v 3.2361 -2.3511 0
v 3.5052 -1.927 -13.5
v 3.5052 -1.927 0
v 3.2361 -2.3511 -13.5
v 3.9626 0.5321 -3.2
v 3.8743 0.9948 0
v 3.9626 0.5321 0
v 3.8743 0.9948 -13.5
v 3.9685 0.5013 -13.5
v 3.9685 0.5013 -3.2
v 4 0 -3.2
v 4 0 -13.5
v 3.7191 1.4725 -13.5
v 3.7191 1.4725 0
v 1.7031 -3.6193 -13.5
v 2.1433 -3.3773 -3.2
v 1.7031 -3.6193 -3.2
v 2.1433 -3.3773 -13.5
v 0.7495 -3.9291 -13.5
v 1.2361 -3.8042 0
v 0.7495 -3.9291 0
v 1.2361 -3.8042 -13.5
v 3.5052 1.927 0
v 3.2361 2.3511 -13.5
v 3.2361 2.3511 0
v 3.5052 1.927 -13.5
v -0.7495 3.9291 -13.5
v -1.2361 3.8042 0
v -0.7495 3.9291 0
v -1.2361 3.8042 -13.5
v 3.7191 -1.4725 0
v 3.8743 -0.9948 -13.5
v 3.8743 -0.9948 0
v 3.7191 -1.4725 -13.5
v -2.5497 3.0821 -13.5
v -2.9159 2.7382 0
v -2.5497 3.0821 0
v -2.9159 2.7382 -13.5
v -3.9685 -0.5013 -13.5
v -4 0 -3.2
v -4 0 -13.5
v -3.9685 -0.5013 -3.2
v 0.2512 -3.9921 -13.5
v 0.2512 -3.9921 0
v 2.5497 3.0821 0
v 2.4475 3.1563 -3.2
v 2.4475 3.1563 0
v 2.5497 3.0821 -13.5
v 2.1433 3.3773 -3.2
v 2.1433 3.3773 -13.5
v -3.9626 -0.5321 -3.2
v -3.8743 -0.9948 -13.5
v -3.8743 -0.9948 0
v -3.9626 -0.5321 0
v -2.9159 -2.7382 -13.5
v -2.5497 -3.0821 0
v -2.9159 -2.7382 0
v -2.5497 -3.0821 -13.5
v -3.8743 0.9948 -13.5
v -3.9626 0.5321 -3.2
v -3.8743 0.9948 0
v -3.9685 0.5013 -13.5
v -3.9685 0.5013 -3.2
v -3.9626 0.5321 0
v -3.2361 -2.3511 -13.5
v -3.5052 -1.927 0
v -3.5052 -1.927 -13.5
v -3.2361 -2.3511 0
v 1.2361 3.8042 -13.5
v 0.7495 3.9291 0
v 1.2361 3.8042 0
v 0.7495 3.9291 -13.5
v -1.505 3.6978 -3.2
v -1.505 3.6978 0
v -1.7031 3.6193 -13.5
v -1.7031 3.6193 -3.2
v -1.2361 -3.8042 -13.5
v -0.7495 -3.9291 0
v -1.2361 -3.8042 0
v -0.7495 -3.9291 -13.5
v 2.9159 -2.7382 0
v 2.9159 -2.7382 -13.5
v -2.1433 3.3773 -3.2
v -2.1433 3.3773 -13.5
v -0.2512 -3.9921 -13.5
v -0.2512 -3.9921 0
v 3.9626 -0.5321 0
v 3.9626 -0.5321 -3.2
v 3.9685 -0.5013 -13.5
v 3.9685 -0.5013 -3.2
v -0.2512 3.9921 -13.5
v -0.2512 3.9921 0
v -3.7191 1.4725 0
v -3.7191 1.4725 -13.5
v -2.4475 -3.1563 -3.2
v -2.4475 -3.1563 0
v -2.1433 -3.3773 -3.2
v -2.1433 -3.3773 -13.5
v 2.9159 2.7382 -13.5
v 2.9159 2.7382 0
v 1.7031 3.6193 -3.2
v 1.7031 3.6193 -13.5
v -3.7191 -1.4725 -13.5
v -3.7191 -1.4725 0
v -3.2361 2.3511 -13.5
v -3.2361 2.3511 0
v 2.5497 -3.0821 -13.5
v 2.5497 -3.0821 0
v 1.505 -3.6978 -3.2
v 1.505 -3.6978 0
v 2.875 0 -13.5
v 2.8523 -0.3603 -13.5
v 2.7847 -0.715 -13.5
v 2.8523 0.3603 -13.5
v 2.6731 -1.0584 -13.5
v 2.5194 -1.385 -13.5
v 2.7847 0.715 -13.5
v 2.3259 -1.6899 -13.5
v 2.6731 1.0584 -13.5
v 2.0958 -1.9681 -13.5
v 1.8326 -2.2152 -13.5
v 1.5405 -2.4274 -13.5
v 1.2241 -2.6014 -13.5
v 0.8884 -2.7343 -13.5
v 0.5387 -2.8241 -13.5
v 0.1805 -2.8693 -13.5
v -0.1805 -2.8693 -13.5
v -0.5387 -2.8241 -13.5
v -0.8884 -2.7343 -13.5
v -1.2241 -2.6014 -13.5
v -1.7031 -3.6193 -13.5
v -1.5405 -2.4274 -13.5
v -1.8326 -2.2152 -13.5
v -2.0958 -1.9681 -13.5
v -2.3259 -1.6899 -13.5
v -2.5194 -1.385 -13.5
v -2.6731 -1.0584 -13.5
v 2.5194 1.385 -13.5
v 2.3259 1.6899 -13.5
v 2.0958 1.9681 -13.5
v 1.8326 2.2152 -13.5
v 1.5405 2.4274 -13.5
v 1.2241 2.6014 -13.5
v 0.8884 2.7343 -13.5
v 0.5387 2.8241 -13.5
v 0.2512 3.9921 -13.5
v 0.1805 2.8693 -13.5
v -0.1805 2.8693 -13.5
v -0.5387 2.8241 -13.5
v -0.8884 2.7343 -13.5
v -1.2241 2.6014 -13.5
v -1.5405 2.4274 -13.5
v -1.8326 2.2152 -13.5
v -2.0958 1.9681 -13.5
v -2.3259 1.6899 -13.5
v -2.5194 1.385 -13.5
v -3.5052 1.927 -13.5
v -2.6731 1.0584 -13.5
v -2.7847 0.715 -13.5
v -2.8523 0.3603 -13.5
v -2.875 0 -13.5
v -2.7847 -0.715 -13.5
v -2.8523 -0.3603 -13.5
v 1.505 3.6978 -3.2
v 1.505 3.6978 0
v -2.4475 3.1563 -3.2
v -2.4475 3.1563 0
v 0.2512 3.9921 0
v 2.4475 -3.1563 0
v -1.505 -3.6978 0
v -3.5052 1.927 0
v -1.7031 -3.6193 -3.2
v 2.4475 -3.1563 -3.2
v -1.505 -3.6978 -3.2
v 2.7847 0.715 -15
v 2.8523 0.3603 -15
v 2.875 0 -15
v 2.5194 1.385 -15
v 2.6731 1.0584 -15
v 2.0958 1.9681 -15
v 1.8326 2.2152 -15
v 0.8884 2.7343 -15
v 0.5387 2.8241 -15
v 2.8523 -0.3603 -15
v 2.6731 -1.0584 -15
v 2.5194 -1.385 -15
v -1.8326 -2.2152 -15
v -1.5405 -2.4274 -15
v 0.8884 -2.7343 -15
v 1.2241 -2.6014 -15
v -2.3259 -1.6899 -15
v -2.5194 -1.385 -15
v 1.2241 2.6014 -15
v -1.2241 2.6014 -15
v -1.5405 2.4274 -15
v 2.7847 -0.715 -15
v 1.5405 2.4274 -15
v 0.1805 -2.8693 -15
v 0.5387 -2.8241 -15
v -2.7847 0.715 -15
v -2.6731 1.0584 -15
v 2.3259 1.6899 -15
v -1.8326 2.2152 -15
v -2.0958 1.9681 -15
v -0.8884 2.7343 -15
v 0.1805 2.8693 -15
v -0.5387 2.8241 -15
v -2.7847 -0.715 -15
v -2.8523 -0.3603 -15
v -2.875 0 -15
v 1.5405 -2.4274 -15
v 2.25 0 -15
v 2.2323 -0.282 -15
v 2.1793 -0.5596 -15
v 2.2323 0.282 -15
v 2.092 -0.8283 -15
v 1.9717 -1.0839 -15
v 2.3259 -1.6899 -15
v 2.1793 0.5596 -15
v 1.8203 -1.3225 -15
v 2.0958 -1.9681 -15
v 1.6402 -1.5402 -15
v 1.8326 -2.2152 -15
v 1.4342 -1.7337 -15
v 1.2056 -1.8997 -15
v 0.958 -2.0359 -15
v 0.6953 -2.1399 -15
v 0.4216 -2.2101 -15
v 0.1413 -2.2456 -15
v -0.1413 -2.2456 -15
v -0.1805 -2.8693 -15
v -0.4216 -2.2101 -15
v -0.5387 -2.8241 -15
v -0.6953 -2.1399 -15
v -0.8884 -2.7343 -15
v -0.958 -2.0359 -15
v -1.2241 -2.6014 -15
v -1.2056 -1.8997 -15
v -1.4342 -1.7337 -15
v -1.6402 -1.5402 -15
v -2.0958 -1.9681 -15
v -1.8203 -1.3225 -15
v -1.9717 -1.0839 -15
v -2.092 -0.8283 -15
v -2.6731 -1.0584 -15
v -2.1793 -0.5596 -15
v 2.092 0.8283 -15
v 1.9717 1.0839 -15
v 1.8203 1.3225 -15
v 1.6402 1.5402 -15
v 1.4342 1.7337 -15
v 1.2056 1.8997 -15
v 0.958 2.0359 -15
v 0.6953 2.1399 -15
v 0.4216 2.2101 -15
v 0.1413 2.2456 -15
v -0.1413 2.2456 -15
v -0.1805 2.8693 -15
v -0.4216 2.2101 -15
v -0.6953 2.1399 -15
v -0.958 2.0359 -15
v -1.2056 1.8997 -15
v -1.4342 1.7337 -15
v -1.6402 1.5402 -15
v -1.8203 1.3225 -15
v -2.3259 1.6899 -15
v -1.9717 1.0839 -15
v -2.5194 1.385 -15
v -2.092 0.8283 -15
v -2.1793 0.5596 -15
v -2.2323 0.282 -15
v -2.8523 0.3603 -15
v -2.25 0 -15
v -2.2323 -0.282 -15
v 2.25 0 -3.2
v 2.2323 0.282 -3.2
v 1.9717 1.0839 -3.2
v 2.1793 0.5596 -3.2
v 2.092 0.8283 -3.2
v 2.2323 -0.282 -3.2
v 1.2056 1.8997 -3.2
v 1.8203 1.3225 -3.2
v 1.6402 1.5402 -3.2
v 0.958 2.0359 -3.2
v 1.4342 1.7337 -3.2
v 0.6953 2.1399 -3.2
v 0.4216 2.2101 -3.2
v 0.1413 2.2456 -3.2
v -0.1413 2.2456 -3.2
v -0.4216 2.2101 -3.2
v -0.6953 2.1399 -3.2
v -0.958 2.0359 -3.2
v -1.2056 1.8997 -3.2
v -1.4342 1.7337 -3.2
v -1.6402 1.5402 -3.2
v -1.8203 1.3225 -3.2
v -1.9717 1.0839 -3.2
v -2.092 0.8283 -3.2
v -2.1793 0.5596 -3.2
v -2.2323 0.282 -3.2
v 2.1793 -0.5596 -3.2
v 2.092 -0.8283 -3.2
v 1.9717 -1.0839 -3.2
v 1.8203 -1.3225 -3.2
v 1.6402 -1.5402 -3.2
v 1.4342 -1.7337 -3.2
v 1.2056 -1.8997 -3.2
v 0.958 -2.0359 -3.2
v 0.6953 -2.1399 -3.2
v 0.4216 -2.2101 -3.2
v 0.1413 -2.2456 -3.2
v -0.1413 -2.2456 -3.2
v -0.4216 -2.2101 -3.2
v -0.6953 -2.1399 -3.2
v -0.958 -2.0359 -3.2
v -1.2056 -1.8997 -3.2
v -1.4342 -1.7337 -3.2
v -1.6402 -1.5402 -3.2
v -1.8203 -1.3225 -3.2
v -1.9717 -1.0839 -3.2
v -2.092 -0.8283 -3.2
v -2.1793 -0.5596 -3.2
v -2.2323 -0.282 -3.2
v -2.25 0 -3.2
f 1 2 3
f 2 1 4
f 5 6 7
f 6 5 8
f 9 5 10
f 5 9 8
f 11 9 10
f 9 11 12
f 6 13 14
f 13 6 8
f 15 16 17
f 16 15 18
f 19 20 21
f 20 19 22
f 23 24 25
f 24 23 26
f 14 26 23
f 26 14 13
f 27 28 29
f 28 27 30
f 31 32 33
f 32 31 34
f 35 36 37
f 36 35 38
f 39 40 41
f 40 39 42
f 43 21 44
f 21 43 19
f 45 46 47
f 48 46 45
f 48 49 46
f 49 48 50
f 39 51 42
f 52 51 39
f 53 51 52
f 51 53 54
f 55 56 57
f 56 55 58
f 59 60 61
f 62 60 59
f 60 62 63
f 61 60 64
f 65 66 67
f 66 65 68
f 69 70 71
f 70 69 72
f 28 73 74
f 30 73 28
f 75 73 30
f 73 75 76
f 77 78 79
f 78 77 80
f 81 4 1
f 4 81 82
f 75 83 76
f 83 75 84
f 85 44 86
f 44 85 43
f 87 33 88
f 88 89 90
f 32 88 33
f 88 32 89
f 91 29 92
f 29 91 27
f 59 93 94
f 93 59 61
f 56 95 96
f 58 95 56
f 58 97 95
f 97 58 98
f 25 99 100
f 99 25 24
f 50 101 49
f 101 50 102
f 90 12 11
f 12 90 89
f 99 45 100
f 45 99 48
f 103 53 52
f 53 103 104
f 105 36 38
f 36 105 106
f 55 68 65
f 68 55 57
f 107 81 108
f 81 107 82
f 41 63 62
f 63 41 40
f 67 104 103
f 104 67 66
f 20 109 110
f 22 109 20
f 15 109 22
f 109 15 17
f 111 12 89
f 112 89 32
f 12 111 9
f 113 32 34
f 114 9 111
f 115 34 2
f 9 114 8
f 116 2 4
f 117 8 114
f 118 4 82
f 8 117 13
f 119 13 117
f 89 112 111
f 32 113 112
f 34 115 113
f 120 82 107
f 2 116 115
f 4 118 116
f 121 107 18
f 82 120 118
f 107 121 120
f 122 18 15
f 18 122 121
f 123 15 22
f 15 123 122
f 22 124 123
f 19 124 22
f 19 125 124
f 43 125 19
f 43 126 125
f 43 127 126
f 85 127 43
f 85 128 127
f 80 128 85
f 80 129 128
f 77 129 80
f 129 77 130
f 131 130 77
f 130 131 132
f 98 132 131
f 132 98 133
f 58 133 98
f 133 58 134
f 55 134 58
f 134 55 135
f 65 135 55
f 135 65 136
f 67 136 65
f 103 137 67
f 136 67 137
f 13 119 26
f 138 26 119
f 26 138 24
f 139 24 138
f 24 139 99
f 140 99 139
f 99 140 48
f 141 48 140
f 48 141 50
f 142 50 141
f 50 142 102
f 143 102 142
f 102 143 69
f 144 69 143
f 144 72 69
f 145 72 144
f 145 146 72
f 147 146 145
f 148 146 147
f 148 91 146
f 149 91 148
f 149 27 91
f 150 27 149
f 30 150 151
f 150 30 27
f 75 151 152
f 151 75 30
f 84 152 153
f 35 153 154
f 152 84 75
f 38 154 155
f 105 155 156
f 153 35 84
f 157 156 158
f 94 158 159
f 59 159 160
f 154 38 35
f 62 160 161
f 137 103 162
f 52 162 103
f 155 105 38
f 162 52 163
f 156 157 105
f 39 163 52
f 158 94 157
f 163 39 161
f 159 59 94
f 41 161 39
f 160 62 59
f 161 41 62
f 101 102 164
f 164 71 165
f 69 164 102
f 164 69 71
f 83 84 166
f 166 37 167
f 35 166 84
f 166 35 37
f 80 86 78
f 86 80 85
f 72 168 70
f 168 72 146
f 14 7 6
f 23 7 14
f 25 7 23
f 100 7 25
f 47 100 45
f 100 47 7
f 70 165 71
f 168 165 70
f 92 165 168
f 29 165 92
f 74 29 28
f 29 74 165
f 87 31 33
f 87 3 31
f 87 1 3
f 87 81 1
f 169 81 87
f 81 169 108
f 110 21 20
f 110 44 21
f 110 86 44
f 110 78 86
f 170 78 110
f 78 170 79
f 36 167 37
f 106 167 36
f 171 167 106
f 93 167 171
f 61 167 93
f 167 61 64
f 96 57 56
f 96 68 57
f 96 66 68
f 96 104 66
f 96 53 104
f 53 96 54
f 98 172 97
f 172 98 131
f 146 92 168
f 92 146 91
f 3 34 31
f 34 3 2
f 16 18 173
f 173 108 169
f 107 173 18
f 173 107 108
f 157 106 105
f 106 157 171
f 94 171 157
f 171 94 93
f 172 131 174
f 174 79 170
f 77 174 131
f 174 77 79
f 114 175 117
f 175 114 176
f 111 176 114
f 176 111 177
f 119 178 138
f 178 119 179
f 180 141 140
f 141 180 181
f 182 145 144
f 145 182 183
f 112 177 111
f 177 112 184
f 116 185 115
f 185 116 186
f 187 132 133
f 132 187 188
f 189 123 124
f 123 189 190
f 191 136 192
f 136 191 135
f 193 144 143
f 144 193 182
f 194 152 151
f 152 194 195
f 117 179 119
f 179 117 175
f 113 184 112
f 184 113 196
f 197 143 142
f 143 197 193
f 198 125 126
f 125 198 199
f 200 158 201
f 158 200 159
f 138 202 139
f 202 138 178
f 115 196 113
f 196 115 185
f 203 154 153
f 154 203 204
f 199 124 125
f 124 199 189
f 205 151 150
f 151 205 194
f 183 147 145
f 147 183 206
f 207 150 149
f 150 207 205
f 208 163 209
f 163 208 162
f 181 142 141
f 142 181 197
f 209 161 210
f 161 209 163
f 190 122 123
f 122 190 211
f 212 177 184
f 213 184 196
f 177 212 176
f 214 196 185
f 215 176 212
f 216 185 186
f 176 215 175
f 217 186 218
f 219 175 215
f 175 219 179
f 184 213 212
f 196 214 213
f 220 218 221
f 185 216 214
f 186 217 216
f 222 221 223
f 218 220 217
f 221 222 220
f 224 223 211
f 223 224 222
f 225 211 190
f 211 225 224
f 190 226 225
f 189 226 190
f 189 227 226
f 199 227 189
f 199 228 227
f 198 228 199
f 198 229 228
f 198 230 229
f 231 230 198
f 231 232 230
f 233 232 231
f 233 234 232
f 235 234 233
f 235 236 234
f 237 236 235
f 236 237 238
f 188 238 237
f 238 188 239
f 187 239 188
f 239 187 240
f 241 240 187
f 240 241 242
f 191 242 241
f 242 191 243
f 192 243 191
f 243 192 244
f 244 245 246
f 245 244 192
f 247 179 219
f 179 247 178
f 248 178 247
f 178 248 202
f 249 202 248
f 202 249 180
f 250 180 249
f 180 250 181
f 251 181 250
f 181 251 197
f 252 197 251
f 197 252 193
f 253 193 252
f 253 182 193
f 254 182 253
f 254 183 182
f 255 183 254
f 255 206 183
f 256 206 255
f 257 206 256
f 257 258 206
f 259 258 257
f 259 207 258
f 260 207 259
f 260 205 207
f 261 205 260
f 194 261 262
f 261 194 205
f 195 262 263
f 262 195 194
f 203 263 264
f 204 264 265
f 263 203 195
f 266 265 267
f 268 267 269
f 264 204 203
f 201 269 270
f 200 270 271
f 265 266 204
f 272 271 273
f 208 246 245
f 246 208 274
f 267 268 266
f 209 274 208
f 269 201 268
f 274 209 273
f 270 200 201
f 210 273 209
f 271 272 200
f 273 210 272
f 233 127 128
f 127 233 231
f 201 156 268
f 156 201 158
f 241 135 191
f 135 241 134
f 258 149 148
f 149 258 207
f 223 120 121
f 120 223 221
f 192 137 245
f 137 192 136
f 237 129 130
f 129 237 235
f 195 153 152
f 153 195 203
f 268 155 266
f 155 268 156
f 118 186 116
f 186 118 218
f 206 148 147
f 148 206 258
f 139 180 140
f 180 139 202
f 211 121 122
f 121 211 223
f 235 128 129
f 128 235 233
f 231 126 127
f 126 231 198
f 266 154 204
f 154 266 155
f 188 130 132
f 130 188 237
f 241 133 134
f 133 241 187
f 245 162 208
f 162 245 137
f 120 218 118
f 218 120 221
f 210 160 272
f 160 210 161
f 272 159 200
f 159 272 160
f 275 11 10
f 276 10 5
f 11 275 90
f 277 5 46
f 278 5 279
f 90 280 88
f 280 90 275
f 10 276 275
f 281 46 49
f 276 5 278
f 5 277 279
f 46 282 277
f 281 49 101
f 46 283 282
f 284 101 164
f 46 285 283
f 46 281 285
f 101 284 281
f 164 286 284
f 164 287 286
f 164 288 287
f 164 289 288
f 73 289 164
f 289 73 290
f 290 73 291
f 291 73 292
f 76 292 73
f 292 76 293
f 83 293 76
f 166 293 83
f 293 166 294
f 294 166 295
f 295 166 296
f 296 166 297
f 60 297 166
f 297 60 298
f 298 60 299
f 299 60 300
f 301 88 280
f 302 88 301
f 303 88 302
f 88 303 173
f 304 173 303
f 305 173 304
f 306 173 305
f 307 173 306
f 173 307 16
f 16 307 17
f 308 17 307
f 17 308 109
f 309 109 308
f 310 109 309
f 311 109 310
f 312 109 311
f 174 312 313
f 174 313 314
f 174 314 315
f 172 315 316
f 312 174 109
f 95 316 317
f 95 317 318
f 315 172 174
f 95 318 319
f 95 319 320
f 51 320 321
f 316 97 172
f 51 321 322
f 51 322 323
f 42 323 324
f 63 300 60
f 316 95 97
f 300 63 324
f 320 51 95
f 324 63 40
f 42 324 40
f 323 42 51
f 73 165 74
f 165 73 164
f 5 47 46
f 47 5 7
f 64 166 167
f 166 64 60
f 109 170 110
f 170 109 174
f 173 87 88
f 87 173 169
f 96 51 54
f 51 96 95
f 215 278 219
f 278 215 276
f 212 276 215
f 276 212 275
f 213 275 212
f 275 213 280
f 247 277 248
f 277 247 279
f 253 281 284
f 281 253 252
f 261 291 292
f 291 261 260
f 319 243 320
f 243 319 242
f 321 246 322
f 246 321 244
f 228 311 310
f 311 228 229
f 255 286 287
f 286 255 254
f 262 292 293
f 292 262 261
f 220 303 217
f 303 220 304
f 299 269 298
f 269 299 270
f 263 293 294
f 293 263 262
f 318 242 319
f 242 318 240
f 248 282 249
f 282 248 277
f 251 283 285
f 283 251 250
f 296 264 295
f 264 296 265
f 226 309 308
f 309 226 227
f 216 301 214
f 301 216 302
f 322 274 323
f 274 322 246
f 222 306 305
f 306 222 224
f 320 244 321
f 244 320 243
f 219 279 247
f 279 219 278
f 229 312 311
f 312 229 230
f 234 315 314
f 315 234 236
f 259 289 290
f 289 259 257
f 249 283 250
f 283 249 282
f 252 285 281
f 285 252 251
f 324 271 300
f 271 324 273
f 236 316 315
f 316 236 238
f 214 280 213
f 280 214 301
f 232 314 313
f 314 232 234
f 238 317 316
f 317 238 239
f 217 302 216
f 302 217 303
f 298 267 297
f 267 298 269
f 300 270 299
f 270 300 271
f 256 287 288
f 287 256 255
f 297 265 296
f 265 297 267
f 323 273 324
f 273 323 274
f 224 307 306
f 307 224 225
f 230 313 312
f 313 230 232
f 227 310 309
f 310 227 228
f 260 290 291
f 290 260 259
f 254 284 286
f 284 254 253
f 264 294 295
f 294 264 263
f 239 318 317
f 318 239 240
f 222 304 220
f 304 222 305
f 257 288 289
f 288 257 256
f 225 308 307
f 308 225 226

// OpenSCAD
$fn = 50;

difference() {
	union() {
		translate(v = [0, 0, -13.5]) {
			cylinder(h = 13.5, r = 4.0);
		}
		#translate(v = [0, 0, -15.0]) {
			cylinder(h = 15, r = 2.875);
		}
	}
	union() {
		translate(v = [0, 0, 0]) {
			rotate(a = [0, 0, 0]) {
				difference() {
					union() {
						translate(v = [0, 0, -3.2]) {
							linear_extrude(height = 3.2) {
								polygon(points = [[4.2698, 0.0], [2.1349000000000005, 3.697755269078796], [-2.134899999999999, 3.6977552690787965], [-4.2698, 5.228996902999369e-16], [-2.134900000000002, -3.6977552690787956], [2.1348999999999974, -3.697755269078798]]);
							}
						}
					}
					union();
				}
			}
		}
		#translate(v = [0, 0, -100.0]) {
			cylinder(h = 200, r = 2.25);
		}
	}
}
